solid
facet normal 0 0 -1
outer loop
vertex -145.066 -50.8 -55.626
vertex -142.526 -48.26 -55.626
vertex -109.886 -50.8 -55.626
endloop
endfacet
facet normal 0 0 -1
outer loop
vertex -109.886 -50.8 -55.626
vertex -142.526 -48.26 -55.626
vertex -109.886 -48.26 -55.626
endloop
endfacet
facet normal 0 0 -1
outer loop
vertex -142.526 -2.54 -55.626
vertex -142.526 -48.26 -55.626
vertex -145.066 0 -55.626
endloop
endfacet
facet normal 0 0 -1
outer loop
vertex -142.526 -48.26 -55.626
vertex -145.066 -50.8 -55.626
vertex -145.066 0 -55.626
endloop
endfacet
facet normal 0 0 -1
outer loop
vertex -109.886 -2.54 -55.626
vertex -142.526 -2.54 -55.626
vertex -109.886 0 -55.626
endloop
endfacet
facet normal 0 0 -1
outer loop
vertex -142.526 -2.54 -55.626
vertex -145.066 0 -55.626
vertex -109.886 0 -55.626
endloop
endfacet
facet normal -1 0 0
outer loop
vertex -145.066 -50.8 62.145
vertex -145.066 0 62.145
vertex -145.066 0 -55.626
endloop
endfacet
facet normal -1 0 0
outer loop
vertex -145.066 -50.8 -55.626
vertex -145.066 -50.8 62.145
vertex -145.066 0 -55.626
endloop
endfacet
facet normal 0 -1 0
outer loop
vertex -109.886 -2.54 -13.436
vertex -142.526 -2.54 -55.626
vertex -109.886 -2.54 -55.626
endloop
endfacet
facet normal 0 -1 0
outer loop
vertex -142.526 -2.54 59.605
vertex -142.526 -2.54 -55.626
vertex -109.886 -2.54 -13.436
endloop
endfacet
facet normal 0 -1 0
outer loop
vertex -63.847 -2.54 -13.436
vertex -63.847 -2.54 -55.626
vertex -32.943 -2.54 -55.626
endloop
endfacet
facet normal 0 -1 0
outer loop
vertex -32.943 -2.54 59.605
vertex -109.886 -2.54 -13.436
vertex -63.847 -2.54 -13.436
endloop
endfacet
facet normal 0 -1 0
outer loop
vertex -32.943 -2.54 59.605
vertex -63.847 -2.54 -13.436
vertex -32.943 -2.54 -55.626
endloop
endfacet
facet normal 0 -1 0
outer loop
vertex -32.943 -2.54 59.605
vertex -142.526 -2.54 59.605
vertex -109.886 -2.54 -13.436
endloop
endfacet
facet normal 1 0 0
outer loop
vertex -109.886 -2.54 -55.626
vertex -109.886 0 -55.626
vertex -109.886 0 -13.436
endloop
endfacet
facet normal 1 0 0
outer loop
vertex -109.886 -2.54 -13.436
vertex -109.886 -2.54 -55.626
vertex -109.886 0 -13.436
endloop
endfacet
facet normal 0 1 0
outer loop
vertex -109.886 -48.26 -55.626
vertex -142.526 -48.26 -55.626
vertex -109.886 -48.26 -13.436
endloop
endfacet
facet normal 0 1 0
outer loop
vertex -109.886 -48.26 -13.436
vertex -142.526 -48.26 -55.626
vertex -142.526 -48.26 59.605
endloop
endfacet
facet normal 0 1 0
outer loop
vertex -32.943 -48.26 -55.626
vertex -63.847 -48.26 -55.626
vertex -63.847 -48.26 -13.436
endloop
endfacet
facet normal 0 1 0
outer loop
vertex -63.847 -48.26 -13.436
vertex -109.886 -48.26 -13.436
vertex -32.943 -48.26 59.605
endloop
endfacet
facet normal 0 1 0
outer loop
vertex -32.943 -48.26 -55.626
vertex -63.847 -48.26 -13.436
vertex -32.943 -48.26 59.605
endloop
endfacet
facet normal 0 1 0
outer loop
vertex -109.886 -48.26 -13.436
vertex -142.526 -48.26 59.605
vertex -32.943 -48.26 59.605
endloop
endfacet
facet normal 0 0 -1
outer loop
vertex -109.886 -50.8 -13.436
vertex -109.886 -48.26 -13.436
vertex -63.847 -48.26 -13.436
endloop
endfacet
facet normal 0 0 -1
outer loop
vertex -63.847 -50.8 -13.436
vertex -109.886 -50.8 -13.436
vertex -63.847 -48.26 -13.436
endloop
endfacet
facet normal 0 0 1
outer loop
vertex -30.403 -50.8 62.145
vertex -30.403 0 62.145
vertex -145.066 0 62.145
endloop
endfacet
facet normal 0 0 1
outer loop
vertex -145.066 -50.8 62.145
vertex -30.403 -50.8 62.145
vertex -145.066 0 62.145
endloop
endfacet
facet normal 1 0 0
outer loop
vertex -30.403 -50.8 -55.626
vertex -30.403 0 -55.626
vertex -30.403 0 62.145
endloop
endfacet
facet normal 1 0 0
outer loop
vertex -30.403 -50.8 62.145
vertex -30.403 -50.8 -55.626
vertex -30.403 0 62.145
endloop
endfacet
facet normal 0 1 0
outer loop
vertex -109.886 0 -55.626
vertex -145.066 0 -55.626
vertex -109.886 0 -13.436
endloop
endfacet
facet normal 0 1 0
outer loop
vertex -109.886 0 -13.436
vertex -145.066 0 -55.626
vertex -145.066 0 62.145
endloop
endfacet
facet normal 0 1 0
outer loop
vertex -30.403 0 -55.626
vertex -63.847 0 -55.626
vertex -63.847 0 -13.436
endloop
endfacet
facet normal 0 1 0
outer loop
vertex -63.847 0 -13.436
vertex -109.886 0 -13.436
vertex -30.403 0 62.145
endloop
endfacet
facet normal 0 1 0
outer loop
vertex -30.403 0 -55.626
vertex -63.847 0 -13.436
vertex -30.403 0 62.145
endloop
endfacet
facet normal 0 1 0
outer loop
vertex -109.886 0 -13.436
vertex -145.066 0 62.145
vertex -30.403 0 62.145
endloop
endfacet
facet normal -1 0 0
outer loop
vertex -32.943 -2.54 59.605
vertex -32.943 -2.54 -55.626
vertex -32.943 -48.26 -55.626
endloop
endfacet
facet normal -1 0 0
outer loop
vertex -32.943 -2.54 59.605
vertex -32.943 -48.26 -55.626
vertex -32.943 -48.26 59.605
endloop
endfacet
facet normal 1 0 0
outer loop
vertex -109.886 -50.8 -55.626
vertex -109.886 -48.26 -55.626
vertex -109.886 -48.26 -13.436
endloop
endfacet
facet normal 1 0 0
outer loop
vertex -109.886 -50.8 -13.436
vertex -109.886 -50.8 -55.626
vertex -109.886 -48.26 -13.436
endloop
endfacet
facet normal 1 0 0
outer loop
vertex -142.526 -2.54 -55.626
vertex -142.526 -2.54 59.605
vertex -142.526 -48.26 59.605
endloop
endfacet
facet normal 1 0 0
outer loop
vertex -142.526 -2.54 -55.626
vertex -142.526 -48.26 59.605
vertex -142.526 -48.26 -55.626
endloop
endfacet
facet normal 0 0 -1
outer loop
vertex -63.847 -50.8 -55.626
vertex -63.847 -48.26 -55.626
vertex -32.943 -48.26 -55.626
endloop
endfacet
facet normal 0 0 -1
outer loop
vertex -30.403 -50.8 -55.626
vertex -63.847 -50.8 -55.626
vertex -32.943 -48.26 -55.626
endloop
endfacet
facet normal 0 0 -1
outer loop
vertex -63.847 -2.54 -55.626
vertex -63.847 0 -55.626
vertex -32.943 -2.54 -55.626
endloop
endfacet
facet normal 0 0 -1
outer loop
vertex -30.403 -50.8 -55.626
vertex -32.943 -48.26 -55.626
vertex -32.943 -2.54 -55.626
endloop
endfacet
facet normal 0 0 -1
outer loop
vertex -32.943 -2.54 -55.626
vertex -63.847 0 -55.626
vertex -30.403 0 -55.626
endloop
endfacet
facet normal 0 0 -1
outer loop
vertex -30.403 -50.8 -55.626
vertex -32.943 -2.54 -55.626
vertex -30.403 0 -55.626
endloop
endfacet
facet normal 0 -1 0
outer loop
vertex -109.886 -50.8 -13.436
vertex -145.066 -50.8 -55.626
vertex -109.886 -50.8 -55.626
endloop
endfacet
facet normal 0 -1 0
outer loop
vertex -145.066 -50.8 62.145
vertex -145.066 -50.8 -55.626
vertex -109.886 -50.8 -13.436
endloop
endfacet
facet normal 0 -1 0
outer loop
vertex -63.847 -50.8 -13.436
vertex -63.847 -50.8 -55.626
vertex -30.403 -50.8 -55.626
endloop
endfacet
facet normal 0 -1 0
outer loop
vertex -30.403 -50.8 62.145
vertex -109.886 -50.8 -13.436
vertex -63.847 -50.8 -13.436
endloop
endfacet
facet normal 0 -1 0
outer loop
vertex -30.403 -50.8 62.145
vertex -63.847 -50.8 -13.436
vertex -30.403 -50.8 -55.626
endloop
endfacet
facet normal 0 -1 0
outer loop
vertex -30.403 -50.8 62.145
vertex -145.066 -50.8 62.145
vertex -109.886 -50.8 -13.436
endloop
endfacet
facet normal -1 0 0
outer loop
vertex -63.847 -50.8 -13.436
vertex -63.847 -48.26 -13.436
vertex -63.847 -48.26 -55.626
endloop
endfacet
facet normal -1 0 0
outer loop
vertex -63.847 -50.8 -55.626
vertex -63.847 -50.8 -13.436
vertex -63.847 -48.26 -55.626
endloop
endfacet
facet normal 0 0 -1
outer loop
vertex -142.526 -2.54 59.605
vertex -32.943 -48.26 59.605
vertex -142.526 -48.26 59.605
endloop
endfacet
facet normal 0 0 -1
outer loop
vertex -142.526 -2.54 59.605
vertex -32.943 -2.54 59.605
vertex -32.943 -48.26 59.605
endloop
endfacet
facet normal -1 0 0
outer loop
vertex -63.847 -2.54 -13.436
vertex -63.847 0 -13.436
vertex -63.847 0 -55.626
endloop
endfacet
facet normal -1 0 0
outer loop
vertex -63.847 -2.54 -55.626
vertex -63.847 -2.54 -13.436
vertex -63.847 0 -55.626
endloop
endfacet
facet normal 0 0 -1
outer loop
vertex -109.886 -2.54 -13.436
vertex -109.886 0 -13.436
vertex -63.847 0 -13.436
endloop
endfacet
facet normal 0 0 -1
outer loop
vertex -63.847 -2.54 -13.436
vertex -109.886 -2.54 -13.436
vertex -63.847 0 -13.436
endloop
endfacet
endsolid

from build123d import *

# Parameters (mm, degrees)
F1_DEPTH = 50.8
F2_T     = -2.54


with BuildPart() as f1:
    # F0 (on Front) → F1 (new body)
    with BuildSketch(Plane.XZ):
        Polygon((-30.403135, 62.145095), (-145.066381, 62.145095), (-145.066381, -55.625658), (-109.885611, -55.625658), (-109.885611, -13.436122), (-63.846581, -13.436122), (-63.846581, -55.625658), (-30.403135, -55.625658), align=None)
    extrude(amount=F1_DEPTH)

    # F2
    f2_openings = [f1.faces().sort_by_distance(p)[0] for p in [
        (-86.866096, -25.4, -13.436122),
        (-109.885611, -25.4, -34.53089),
        (-63.846581, -25.4, -34.53089),
        (-127.475996, -25.4, -55.625658),
        (-47.124858, -25.4, -55.625658),
    ]]
    offset(amount=F2_T, openings=f2_openings)


solid = f1.part
